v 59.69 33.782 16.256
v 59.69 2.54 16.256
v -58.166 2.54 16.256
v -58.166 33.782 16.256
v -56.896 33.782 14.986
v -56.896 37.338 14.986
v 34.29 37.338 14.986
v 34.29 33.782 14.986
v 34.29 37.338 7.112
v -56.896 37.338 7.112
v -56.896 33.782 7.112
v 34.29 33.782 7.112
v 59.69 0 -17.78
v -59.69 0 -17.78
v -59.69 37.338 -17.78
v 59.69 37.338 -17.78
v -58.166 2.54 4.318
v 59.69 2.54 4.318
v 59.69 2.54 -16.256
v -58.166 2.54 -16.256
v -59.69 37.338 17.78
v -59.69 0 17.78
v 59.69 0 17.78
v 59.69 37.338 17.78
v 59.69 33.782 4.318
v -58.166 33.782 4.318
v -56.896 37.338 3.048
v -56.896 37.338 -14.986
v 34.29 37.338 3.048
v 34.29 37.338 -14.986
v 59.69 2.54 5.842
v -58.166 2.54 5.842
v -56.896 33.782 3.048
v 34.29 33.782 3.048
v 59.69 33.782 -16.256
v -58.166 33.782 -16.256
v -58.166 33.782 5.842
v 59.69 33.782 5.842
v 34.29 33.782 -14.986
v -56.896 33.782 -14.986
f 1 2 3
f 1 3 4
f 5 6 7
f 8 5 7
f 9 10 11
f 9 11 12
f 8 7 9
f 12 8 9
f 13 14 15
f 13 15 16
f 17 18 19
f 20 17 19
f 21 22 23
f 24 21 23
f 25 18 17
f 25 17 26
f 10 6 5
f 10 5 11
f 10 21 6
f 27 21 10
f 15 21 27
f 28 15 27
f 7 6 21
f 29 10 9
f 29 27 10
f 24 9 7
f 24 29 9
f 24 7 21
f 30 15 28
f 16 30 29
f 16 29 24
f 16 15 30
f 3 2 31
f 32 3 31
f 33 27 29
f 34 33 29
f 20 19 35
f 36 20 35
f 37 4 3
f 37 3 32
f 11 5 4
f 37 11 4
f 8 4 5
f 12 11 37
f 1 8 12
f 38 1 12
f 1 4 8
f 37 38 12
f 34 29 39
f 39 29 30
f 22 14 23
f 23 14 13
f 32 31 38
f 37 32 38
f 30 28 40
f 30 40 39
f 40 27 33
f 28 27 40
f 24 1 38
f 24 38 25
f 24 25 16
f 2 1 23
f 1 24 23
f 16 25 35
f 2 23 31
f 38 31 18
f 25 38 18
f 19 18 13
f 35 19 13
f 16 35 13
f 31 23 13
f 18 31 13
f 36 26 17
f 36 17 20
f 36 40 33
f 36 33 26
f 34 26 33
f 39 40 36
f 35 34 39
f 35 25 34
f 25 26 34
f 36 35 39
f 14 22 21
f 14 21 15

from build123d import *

# Parameters (mm, degrees)
SKETCH1_W           = 119.38
SKETCH1_H           = 35.56
BOSS_EXTRUDE1_DEPTH = 37.338
SKETCH2_W           = 10.414
SKETCH2_H           = 31.242
SKETCH2_W_2         = 20.574
CUT_EXTRUDE1_DEPTH  = 117.856
CUT_EXTRUDE2_REACH  = 39.338
SKETCH3_W           = 91.186
SKETCH3_H           = 18.034
SKETCH3_H_2         = 7.874


with BuildPart() as part:
    # Sketch1 → Boss-Extrude1 (new body)
    with BuildSketch(Plane(origin=(0, 0, 0), x_dir=(1, 0, 0), z_dir=(0, 1, 0))):
        Rectangle(SKETCH1_W, SKETCH1_H)
    extrude(amount=BOSS_EXTRUDE1_DEPTH)

    # Sketch2 → Cut-Extrude1 (cut)
    with BuildSketch(Plane(origin=(59.69, 0, 0), x_dir=(0, 0, -1), z_dir=(1, 0, 0))):
        with Locations((-11.049, 18.161)):
            Rectangle(SKETCH2_W, SKETCH2_H)
        with Locations((5.969, 18.161)):
            Rectangle(SKETCH2_W_2, SKETCH2_H)
    extrude(amount=-CUT_EXTRUDE1_DEPTH, mode=Mode.SUBTRACT)

    # Sketch3 → Cut-Extrude2 (cut, up to next)
    with BuildSketch(Plane(origin=(0, 37.338, 0), x_dir=(1, 0, 0), z_dir=(0, 1, 0)), mode=Mode.PRIVATE) as cut_extrude2_sk1:
        with Locations((-11.303, 5.969)):
            Rectangle(SKETCH3_W, SKETCH3_H)
    cut_extrude2_tool1 = extrude(cut_extrude2_sk1.sketch, amount=-CUT_EXTRUDE2_REACH, mode=Mode.PRIVATE) & part.part
    add(cut_extrude2_tool1.solids().sort_by_distance((-11.303, 37.338, -5.969))[0], mode=Mode.SUBTRACT)
    # Sketch3 → Cut-Extrude2 (cut, up to next)
    with BuildSketch(Plane(origin=(0, 37.338, 0), x_dir=(1, 0, 0), z_dir=(0, 1, 0)), mode=Mode.PRIVATE) as cut_extrude2_sk2:
        with Locations((-11.303, -11.049)):
            Rectangle(SKETCH3_W, SKETCH3_H_2)
    cut_extrude2_tool2 = extrude(cut_extrude2_sk2.sketch, amount=-CUT_EXTRUDE2_REACH, mode=Mode.PRIVATE) & part.part
    add(cut_extrude2_tool2.solids().sort_by_distance((-11.303, 37.338, 11.049))[0], mode=Mode.SUBTRACT)


solid = part.part
